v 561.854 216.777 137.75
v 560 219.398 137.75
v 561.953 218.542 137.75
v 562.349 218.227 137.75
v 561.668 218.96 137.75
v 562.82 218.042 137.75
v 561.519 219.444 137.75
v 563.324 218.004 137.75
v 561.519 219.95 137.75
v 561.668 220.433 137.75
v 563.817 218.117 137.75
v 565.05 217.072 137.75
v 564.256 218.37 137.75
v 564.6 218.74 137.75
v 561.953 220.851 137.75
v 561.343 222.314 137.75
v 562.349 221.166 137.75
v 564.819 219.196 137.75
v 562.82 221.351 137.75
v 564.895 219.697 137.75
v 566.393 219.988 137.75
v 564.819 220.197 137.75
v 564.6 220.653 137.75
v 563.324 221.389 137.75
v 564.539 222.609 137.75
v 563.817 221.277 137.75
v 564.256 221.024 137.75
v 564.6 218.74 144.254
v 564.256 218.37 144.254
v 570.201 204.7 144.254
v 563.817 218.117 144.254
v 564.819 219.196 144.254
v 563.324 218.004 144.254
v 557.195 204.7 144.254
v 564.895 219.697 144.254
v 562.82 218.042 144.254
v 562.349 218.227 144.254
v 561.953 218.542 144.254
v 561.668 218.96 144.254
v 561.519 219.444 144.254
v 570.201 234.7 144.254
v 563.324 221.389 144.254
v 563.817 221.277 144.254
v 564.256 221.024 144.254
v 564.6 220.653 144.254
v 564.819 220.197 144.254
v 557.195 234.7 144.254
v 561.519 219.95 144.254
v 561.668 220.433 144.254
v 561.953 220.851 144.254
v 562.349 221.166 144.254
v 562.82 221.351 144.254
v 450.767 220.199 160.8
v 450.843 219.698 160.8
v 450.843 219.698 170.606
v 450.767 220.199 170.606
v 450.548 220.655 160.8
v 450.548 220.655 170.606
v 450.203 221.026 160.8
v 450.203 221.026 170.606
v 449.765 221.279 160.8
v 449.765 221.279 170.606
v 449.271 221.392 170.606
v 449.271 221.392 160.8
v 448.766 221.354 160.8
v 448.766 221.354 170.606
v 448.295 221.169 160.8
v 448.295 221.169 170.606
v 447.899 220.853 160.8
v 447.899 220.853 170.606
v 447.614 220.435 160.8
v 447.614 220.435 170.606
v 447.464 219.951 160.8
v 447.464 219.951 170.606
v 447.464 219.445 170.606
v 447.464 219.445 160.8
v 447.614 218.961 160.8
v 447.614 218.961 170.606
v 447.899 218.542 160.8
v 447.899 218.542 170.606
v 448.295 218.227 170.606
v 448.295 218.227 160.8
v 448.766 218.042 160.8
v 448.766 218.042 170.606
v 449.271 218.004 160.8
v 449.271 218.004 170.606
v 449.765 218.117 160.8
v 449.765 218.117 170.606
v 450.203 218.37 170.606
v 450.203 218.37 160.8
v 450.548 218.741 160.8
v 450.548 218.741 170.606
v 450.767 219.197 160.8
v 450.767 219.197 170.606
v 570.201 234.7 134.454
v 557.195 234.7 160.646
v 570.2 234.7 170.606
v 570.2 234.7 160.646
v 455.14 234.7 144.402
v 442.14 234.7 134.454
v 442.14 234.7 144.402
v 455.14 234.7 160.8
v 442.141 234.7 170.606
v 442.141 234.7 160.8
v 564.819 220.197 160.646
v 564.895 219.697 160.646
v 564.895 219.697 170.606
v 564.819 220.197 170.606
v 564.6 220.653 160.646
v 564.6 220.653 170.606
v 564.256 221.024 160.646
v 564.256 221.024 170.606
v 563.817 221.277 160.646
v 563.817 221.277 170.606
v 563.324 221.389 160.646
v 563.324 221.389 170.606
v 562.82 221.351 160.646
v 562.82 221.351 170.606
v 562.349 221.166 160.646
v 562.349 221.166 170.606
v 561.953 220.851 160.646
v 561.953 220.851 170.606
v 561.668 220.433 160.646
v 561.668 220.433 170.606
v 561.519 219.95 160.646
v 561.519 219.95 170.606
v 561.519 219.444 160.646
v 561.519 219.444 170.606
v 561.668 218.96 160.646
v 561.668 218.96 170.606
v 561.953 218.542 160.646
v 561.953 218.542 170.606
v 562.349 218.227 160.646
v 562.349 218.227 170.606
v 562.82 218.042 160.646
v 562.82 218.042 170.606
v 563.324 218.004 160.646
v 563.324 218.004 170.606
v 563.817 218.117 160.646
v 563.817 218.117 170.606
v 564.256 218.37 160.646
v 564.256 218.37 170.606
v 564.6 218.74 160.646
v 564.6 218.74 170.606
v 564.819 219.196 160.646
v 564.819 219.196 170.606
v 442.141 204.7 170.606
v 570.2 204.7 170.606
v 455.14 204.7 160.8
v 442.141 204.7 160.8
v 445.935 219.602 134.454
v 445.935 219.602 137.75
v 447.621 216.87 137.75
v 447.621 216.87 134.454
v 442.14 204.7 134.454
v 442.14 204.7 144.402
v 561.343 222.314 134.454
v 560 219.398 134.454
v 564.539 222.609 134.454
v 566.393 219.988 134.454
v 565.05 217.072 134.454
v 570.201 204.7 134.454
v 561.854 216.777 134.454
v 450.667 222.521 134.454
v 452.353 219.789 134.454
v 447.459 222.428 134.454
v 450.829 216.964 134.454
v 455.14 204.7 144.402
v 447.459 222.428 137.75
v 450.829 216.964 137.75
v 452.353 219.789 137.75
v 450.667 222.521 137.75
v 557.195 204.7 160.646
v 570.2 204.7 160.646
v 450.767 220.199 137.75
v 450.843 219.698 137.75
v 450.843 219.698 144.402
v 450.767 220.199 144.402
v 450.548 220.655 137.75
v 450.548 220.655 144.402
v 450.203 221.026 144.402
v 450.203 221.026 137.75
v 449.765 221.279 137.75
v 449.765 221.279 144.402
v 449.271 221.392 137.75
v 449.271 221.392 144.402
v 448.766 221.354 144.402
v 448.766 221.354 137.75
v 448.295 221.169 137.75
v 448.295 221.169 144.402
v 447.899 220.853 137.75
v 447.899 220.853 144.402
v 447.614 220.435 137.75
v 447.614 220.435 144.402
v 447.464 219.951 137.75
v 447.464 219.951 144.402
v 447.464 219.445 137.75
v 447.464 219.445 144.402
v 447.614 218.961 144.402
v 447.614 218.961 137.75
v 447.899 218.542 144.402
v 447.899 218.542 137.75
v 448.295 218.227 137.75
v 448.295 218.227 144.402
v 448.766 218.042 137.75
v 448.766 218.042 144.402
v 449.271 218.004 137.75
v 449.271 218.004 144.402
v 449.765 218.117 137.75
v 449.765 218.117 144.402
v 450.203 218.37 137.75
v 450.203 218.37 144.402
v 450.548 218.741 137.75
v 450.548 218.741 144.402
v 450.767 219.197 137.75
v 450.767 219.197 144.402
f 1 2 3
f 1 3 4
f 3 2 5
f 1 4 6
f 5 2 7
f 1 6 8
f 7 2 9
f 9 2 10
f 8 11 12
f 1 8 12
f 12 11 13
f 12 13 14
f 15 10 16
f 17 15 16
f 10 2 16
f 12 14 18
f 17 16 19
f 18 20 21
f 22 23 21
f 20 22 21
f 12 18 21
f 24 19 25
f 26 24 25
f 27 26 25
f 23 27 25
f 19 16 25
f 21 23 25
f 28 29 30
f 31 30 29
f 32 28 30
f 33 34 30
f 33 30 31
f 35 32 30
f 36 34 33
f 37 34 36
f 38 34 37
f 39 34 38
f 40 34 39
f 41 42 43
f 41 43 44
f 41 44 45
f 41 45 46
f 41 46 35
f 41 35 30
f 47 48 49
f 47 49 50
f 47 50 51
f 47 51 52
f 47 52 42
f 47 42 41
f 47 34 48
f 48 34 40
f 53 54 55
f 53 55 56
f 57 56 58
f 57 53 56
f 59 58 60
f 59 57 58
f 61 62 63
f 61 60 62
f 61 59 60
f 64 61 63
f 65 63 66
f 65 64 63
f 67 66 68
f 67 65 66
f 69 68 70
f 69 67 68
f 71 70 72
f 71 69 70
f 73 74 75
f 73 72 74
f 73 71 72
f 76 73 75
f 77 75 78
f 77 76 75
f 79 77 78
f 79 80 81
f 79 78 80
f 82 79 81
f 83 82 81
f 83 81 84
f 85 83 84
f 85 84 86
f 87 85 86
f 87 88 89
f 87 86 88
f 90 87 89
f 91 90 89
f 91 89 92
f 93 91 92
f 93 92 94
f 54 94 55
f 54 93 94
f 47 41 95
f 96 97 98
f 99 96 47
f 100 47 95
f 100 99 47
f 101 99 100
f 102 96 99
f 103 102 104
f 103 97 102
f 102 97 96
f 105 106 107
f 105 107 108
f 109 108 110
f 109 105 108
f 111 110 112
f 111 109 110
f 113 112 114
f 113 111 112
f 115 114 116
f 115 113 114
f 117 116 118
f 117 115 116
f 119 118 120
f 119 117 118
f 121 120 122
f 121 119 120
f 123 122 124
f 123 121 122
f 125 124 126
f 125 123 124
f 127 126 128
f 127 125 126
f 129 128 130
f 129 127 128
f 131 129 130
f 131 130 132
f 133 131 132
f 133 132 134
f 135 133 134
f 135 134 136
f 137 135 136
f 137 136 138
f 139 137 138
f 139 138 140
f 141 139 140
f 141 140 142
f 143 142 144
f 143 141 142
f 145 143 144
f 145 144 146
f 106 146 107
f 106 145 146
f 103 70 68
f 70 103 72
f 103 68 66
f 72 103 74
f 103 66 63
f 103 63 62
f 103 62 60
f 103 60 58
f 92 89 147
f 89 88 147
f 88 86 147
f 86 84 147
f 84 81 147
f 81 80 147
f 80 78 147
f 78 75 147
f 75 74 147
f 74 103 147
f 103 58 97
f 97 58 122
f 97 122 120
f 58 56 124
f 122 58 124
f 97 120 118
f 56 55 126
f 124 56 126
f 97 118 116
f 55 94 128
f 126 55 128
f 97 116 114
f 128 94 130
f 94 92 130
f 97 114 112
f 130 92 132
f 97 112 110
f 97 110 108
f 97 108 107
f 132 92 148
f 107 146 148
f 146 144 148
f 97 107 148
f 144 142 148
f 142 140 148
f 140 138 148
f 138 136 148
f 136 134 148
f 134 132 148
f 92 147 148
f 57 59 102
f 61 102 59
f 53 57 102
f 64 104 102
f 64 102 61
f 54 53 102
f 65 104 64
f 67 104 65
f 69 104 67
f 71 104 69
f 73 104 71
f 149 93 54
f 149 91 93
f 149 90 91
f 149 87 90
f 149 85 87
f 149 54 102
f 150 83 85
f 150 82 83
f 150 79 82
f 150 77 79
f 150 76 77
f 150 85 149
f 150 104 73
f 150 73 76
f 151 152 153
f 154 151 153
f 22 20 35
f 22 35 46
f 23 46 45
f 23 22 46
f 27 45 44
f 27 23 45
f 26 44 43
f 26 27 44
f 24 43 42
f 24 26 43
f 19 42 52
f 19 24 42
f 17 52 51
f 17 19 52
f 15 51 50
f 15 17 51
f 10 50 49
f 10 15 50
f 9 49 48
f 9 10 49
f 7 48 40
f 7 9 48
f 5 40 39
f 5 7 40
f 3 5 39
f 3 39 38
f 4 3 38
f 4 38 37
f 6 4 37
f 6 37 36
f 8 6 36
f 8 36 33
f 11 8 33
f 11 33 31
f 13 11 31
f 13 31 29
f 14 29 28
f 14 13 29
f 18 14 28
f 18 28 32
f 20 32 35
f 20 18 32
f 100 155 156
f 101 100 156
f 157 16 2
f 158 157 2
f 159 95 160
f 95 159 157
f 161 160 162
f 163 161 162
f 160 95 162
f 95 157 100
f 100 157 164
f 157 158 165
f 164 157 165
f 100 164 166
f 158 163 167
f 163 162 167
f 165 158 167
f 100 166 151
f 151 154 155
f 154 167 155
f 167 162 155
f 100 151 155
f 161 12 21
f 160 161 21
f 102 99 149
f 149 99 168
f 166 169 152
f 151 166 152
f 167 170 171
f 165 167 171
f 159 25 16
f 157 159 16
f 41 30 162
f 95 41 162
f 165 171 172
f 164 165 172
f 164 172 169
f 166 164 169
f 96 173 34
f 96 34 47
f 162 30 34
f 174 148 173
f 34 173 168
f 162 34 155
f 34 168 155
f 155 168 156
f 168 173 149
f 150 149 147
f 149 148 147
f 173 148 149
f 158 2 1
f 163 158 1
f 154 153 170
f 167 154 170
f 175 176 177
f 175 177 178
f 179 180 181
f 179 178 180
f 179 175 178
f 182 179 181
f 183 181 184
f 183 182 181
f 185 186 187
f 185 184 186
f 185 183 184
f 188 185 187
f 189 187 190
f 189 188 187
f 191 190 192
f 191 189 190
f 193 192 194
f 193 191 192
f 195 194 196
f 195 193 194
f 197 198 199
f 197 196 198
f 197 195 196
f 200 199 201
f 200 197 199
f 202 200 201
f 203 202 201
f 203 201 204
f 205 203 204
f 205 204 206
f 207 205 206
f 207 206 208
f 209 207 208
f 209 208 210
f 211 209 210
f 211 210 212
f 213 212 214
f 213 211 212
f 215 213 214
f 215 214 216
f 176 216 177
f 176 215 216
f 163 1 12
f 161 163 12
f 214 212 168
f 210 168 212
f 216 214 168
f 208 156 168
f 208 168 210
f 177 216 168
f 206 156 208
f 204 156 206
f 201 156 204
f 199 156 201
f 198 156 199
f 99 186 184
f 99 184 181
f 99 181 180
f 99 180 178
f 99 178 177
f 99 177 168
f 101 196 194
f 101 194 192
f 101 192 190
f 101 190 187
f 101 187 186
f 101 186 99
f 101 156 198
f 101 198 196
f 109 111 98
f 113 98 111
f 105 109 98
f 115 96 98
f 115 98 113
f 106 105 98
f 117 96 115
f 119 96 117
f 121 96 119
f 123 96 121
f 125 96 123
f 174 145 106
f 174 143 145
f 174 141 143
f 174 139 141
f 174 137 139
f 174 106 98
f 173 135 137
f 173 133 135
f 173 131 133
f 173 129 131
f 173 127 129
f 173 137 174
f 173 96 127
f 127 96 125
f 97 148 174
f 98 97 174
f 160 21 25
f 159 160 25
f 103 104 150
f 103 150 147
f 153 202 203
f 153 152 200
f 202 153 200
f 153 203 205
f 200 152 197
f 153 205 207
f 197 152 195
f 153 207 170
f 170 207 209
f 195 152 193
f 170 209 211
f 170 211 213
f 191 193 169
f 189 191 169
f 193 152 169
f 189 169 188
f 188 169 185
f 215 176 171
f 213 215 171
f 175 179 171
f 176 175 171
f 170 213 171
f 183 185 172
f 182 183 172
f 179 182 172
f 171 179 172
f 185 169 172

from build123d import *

# Parameters (mm, degrees)
PAD_DEPTH          = 30
SKETCH001_R        = 1.698779
SKETCH001_R_2      = 1.697275
POCKET_DEPTH       = 137.607308
POCKET001_DEPTH    = 3.3
POCKET001_FACE8_W  = 30
POCKET001_FACE8_H  = 12.999695
POCKET001_FACE8_R  = 1.698779
POCKET002_DEPTH    = 0.2
POCKET002_FACE11_W = 30
POCKET002_FACE11_H = 13.000122
POCKET002_FACE11_R = 1.698779
POCKET003_DEPTH    = 0.2
POCKET003_FACE16_W = 30
POCKET003_FACE16_H = 13.005555
POCKET003_FACE16_R = 1.697275
POCKET004_DEPTH    = 0.2
POCKET004_FACE19_W = 30
POCKET004_FACE19_H = 13.004761
POCKET004_FACE19_R = 1.697275
POCKET005_DEPTH    = 0.2


with BuildPart() as part:
    # Sketch → Pad (new body)
    with BuildSketch(Plane.XZ.offset(-204.7)):
        Polygon((442.140533, 170.606308), (570.199951, 170.606308), (570.199951, 160.446457), (557.19519, 160.446457), (557.19519, 144.454102), (570.200745, 144.454102), (570.200745, 134.453659), (442.140106, 134.453659), (442.140106, 144.601944), (455.140228, 144.601944), (455.140228, 160.599991), (442.140533, 160.599991), align=None)
    extrude(amount=-PAD_DEPTH)

    # Sketch001 → Pocket (cut, through all)
    with BuildSketch(Plane.XY.offset(33)):
        with Locations((449.144109, 219.697878)):
            Circle(SKETCH001_R)
        with Locations((563.197394, 219.696552)):
            Circle(SKETCH001_R_2)
    extrude(amount=POCKET_DEPTH, mode=Mode.SUBTRACT)

    # Sketch002 → Pocket001 (cut)
    with BuildSketch(Plane.XY.offset(134.45)):
        Polygon((447.4586694554, 222.4277322113), (445.9354318133, 219.6021619882), (447.6208285856, 216.8702143825), (450.829463, 216.963837), (452.3527006421, 219.7894072231), (450.6673038698, 222.5213548287), align=None)
        Polygon((561.3429027745, 222.3136473905), (560.000239016, 219.3979392379), (561.8539844669, 216.7773042379), (565.0503936764, 217.0723773905), (566.393057435, 219.9880855431), (564.539311984, 222.6087205431), align=None)
    extrude(amount=POCKET001_DEPTH, mode=Mode.SUBTRACT)

    # Pocket001 Face8 → Pocket002 (cut)
    with BuildSketch(Plane(origin=(448.6283915528, 219.7000505045, 160.599991), x_dir=(0, -1, 0), z_dir=(0, 0, -1))):
        with Locations((5.05045e-05, -0.0119889472)):
            Rectangle(POCKET001_FACE8_W, POCKET001_FACE8_H)
        with Locations((0.0021725045, -0.5157174472)):
            Circle(POCKET001_FACE8_R, mode=Mode.SUBTRACT)
    extrude(amount=-POCKET002_DEPTH, mode=Mode.SUBTRACT)

    # Pocket002 Face11 → Pocket003 (cut)
    with BuildSketch(Plane(origin=(448.6281733748, 219.7000505028, 144.601944), x_dir=(0, 1, 0), z_dir=(0, 0, 1))):
        with Locations((-5.05028e-05, -0.0119936252)):
            Rectangle(POCKET002_FACE11_W, POCKET002_FACE11_H)
        with Locations((-0.0021725028, -0.5159356252)):
            Circle(POCKET002_FACE11_R, mode=Mode.SUBTRACT)
    extrude(amount=-POCKET003_DEPTH, mode=Mode.SUBTRACT)

    # Pocket003 Face16 → Pocket004 (cut)
    with BuildSketch(Plane(origin=(563.709854284, 219.7000818773, 144.454102), x_dir=(0, 1, 0), z_dir=(0, 0, 1))):
        with Locations((-8.18773e-05, 0.011886784)):
            Rectangle(POCKET003_FACE16_W, POCKET003_FACE16_H)
        with Locations((-0.0035298773, 0.512460284)):
            Circle(POCKET003_FACE16_R, mode=Mode.SUBTRACT)
    extrude(amount=-POCKET004_DEPTH, mode=Mode.SUBTRACT)

    # Pocket004 Face19 → Pocket005 (cut)
    with BuildSketch(Plane(origin=(563.7094485991, 219.7000818825, 160.446457), x_dir=(0, -1, 0), z_dir=(0, 0, -1))):
        with Locations((8.18825e-05, 0.0118780991)):
            Rectangle(POCKET004_FACE19_W, POCKET004_FACE19_H)
        with Locations((0.0035298825, 0.5120545991)):
            Circle(POCKET004_FACE19_R, mode=Mode.SUBTRACT)
    extrude(amount=-POCKET005_DEPTH, mode=Mode.SUBTRACT)


solid = part.part
